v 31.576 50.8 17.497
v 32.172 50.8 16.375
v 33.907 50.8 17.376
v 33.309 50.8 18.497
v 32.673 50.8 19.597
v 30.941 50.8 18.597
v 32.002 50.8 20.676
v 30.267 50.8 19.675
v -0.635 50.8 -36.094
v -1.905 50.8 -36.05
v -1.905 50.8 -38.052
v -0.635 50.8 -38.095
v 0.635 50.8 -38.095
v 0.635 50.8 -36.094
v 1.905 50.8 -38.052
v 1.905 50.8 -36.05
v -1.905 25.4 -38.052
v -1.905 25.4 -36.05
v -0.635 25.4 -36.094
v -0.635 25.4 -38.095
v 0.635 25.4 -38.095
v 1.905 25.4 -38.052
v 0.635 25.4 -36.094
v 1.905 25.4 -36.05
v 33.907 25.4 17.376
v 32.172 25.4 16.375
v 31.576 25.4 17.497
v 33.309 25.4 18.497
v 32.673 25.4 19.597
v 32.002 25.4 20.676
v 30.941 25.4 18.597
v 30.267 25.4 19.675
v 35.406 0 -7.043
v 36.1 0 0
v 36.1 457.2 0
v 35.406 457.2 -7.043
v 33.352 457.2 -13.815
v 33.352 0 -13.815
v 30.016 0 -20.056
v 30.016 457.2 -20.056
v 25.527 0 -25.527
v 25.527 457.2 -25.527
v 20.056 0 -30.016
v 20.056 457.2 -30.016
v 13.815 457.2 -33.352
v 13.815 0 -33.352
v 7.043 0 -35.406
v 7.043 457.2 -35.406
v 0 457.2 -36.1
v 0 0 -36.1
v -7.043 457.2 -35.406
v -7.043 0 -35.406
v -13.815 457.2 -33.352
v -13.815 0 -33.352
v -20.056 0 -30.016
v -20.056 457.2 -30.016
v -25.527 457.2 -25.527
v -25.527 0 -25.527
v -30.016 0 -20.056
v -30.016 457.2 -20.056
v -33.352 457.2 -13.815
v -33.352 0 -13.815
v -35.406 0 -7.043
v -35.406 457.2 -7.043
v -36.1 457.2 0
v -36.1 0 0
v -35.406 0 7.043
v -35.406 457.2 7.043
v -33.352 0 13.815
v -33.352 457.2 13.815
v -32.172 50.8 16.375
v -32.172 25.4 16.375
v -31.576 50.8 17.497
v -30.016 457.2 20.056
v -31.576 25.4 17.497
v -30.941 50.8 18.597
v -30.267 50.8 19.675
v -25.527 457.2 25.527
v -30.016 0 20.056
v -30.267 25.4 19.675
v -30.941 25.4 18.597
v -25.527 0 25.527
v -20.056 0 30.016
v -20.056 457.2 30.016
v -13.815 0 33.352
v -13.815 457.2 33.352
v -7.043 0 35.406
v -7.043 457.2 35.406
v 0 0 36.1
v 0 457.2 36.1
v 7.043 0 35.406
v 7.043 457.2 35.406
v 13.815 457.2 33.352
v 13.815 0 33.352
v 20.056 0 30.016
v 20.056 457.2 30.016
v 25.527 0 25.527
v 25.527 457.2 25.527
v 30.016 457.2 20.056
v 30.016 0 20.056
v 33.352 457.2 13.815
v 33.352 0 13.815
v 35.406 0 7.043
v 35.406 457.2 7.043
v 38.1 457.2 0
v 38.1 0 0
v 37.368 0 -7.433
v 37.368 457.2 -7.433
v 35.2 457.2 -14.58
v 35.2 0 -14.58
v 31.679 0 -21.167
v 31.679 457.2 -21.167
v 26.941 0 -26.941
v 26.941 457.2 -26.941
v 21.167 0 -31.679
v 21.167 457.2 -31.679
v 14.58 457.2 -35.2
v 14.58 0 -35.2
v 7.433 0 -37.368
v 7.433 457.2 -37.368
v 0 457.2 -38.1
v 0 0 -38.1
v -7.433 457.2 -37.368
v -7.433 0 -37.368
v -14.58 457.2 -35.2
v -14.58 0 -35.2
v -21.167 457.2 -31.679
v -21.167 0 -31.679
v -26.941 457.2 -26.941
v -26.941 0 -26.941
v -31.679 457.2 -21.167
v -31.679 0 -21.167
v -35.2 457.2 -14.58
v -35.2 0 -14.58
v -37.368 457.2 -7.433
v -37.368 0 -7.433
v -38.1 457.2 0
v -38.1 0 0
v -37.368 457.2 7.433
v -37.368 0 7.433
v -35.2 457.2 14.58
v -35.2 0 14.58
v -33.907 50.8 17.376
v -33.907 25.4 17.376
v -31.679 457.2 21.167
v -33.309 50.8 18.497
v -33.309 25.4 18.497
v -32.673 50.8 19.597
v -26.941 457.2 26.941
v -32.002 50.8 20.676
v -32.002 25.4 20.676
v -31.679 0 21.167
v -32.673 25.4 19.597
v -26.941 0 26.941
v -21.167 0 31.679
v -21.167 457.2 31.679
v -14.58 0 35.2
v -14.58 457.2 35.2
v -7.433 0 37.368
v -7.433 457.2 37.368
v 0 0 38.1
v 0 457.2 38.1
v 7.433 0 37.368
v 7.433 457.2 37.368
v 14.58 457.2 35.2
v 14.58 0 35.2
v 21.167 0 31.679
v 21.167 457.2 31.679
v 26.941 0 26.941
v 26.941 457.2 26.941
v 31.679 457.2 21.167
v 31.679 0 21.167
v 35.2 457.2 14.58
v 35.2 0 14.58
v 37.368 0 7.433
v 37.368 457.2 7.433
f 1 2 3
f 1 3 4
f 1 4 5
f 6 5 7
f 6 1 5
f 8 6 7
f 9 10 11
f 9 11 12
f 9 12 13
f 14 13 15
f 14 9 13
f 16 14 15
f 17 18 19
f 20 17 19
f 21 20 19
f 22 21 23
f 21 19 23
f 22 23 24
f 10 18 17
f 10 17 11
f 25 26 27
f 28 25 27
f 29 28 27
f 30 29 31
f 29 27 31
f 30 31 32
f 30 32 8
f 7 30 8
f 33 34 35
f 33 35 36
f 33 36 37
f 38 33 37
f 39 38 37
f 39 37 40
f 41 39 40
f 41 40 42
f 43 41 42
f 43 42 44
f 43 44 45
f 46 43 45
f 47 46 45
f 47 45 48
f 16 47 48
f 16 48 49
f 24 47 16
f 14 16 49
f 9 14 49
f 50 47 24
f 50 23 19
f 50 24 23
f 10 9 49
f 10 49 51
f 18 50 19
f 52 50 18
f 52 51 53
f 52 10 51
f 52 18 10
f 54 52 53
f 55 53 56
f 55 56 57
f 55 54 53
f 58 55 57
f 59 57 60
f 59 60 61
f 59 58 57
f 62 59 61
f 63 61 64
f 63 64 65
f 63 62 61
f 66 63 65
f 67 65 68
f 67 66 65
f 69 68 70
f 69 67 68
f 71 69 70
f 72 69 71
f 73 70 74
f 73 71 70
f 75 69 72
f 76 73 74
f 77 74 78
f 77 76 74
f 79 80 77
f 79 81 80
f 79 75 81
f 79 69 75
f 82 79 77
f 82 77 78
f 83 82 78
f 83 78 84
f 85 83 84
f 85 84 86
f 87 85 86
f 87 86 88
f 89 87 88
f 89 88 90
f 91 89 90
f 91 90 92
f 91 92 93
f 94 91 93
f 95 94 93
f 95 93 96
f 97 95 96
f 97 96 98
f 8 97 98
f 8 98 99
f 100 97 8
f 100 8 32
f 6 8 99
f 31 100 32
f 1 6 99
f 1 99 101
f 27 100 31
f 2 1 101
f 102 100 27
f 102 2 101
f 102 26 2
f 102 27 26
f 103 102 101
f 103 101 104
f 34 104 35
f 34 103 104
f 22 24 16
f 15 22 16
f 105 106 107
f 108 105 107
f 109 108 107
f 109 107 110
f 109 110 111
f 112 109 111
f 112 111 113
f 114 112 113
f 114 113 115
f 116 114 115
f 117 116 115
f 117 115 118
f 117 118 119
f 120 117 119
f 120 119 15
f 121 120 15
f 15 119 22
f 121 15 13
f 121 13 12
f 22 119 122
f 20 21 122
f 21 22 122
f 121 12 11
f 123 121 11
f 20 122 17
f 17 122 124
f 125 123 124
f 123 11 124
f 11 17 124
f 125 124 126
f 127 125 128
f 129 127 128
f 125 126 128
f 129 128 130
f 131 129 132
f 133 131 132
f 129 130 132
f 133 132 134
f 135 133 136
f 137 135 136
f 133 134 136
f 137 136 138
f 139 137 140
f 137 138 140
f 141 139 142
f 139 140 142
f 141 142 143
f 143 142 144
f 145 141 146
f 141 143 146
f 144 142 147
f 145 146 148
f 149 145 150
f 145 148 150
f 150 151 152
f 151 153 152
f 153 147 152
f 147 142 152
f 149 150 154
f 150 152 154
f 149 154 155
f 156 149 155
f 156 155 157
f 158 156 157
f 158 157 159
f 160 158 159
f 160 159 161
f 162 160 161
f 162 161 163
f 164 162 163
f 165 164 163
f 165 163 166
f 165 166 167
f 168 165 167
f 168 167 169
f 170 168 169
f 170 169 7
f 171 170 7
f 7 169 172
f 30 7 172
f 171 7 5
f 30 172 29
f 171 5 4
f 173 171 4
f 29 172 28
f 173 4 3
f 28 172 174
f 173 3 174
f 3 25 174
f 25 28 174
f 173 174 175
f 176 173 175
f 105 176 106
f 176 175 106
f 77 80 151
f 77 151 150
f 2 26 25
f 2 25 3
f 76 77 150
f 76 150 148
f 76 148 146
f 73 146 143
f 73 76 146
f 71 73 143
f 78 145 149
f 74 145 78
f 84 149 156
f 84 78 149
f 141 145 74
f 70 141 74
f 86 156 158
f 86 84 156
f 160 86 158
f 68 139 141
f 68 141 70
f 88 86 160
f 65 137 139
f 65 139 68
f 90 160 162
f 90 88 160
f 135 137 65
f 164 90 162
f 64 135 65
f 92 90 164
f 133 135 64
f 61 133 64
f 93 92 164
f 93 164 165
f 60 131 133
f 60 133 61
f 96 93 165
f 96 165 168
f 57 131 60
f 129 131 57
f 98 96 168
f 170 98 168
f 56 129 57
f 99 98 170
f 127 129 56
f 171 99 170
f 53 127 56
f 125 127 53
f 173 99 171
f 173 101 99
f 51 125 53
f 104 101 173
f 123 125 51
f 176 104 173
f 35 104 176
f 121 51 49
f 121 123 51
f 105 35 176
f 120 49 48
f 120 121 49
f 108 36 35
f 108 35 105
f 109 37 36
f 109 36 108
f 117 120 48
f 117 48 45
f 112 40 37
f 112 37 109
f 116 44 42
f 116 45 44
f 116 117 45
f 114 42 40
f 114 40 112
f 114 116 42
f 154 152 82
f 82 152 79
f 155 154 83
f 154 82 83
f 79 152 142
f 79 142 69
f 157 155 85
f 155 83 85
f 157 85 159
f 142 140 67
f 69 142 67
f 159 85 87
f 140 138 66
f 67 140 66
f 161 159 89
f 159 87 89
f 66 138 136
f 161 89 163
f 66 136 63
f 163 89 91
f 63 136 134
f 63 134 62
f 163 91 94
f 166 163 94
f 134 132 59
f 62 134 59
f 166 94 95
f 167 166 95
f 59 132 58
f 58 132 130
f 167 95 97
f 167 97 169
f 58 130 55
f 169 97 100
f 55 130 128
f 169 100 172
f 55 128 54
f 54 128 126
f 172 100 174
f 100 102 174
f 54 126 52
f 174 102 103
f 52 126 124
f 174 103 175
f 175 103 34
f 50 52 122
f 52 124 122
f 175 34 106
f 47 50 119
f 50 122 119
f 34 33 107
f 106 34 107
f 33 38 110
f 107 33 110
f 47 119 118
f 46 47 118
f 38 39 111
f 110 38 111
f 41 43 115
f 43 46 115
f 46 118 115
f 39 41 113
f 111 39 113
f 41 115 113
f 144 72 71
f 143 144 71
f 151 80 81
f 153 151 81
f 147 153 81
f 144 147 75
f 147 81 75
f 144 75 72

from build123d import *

# Parameters (mm, degrees)
SKETCH1_R           = 38.1
SKETCH1_R_2         = 36.1
BOSS_EXTRUDE1_DEPTH = 457.2
SKETCH2_W           = 3.81
SKETCH2_H           = 25.4
CUT_EXTRUDE1_DEPTH  = 39.1
CIRPATTERN1_COUNT   = 3


with BuildPart() as part:
    # Sketch1 → Boss-Extrude1 (new body)
    with BuildSketch(Plane(origin=(0, 0, 0), x_dir=(1, 0, 0), z_dir=(0, 1, 0))):
        Circle(SKETCH1_R)
        Circle(SKETCH1_R_2, mode=Mode.SUBTRACT)
    extrude(amount=BOSS_EXTRUDE1_DEPTH)

    # Sketch2 → Cut-Extrude1 (cut, through all)
    with BuildSketch(Plane.XY):
        with Locations((0, 38.1)):
            Rectangle(SKETCH2_W, SKETCH2_H)
    cut_extrude1 = extrude(amount=-CUT_EXTRUDE1_DEPTH, mode=Mode.SUBTRACT)

    # CirPattern1: Cut-Extrude1 ×3 about axis
    cirpattern1_axis = Axis((0, 0, 0), (0, 1, 0))
    for i in range(1, CIRPATTERN1_COUNT):
        add(cut_extrude1.rotate(cirpattern1_axis, i * 360 / CIRPATTERN1_COUNT), mode=Mode.SUBTRACT)


solid = part.part
